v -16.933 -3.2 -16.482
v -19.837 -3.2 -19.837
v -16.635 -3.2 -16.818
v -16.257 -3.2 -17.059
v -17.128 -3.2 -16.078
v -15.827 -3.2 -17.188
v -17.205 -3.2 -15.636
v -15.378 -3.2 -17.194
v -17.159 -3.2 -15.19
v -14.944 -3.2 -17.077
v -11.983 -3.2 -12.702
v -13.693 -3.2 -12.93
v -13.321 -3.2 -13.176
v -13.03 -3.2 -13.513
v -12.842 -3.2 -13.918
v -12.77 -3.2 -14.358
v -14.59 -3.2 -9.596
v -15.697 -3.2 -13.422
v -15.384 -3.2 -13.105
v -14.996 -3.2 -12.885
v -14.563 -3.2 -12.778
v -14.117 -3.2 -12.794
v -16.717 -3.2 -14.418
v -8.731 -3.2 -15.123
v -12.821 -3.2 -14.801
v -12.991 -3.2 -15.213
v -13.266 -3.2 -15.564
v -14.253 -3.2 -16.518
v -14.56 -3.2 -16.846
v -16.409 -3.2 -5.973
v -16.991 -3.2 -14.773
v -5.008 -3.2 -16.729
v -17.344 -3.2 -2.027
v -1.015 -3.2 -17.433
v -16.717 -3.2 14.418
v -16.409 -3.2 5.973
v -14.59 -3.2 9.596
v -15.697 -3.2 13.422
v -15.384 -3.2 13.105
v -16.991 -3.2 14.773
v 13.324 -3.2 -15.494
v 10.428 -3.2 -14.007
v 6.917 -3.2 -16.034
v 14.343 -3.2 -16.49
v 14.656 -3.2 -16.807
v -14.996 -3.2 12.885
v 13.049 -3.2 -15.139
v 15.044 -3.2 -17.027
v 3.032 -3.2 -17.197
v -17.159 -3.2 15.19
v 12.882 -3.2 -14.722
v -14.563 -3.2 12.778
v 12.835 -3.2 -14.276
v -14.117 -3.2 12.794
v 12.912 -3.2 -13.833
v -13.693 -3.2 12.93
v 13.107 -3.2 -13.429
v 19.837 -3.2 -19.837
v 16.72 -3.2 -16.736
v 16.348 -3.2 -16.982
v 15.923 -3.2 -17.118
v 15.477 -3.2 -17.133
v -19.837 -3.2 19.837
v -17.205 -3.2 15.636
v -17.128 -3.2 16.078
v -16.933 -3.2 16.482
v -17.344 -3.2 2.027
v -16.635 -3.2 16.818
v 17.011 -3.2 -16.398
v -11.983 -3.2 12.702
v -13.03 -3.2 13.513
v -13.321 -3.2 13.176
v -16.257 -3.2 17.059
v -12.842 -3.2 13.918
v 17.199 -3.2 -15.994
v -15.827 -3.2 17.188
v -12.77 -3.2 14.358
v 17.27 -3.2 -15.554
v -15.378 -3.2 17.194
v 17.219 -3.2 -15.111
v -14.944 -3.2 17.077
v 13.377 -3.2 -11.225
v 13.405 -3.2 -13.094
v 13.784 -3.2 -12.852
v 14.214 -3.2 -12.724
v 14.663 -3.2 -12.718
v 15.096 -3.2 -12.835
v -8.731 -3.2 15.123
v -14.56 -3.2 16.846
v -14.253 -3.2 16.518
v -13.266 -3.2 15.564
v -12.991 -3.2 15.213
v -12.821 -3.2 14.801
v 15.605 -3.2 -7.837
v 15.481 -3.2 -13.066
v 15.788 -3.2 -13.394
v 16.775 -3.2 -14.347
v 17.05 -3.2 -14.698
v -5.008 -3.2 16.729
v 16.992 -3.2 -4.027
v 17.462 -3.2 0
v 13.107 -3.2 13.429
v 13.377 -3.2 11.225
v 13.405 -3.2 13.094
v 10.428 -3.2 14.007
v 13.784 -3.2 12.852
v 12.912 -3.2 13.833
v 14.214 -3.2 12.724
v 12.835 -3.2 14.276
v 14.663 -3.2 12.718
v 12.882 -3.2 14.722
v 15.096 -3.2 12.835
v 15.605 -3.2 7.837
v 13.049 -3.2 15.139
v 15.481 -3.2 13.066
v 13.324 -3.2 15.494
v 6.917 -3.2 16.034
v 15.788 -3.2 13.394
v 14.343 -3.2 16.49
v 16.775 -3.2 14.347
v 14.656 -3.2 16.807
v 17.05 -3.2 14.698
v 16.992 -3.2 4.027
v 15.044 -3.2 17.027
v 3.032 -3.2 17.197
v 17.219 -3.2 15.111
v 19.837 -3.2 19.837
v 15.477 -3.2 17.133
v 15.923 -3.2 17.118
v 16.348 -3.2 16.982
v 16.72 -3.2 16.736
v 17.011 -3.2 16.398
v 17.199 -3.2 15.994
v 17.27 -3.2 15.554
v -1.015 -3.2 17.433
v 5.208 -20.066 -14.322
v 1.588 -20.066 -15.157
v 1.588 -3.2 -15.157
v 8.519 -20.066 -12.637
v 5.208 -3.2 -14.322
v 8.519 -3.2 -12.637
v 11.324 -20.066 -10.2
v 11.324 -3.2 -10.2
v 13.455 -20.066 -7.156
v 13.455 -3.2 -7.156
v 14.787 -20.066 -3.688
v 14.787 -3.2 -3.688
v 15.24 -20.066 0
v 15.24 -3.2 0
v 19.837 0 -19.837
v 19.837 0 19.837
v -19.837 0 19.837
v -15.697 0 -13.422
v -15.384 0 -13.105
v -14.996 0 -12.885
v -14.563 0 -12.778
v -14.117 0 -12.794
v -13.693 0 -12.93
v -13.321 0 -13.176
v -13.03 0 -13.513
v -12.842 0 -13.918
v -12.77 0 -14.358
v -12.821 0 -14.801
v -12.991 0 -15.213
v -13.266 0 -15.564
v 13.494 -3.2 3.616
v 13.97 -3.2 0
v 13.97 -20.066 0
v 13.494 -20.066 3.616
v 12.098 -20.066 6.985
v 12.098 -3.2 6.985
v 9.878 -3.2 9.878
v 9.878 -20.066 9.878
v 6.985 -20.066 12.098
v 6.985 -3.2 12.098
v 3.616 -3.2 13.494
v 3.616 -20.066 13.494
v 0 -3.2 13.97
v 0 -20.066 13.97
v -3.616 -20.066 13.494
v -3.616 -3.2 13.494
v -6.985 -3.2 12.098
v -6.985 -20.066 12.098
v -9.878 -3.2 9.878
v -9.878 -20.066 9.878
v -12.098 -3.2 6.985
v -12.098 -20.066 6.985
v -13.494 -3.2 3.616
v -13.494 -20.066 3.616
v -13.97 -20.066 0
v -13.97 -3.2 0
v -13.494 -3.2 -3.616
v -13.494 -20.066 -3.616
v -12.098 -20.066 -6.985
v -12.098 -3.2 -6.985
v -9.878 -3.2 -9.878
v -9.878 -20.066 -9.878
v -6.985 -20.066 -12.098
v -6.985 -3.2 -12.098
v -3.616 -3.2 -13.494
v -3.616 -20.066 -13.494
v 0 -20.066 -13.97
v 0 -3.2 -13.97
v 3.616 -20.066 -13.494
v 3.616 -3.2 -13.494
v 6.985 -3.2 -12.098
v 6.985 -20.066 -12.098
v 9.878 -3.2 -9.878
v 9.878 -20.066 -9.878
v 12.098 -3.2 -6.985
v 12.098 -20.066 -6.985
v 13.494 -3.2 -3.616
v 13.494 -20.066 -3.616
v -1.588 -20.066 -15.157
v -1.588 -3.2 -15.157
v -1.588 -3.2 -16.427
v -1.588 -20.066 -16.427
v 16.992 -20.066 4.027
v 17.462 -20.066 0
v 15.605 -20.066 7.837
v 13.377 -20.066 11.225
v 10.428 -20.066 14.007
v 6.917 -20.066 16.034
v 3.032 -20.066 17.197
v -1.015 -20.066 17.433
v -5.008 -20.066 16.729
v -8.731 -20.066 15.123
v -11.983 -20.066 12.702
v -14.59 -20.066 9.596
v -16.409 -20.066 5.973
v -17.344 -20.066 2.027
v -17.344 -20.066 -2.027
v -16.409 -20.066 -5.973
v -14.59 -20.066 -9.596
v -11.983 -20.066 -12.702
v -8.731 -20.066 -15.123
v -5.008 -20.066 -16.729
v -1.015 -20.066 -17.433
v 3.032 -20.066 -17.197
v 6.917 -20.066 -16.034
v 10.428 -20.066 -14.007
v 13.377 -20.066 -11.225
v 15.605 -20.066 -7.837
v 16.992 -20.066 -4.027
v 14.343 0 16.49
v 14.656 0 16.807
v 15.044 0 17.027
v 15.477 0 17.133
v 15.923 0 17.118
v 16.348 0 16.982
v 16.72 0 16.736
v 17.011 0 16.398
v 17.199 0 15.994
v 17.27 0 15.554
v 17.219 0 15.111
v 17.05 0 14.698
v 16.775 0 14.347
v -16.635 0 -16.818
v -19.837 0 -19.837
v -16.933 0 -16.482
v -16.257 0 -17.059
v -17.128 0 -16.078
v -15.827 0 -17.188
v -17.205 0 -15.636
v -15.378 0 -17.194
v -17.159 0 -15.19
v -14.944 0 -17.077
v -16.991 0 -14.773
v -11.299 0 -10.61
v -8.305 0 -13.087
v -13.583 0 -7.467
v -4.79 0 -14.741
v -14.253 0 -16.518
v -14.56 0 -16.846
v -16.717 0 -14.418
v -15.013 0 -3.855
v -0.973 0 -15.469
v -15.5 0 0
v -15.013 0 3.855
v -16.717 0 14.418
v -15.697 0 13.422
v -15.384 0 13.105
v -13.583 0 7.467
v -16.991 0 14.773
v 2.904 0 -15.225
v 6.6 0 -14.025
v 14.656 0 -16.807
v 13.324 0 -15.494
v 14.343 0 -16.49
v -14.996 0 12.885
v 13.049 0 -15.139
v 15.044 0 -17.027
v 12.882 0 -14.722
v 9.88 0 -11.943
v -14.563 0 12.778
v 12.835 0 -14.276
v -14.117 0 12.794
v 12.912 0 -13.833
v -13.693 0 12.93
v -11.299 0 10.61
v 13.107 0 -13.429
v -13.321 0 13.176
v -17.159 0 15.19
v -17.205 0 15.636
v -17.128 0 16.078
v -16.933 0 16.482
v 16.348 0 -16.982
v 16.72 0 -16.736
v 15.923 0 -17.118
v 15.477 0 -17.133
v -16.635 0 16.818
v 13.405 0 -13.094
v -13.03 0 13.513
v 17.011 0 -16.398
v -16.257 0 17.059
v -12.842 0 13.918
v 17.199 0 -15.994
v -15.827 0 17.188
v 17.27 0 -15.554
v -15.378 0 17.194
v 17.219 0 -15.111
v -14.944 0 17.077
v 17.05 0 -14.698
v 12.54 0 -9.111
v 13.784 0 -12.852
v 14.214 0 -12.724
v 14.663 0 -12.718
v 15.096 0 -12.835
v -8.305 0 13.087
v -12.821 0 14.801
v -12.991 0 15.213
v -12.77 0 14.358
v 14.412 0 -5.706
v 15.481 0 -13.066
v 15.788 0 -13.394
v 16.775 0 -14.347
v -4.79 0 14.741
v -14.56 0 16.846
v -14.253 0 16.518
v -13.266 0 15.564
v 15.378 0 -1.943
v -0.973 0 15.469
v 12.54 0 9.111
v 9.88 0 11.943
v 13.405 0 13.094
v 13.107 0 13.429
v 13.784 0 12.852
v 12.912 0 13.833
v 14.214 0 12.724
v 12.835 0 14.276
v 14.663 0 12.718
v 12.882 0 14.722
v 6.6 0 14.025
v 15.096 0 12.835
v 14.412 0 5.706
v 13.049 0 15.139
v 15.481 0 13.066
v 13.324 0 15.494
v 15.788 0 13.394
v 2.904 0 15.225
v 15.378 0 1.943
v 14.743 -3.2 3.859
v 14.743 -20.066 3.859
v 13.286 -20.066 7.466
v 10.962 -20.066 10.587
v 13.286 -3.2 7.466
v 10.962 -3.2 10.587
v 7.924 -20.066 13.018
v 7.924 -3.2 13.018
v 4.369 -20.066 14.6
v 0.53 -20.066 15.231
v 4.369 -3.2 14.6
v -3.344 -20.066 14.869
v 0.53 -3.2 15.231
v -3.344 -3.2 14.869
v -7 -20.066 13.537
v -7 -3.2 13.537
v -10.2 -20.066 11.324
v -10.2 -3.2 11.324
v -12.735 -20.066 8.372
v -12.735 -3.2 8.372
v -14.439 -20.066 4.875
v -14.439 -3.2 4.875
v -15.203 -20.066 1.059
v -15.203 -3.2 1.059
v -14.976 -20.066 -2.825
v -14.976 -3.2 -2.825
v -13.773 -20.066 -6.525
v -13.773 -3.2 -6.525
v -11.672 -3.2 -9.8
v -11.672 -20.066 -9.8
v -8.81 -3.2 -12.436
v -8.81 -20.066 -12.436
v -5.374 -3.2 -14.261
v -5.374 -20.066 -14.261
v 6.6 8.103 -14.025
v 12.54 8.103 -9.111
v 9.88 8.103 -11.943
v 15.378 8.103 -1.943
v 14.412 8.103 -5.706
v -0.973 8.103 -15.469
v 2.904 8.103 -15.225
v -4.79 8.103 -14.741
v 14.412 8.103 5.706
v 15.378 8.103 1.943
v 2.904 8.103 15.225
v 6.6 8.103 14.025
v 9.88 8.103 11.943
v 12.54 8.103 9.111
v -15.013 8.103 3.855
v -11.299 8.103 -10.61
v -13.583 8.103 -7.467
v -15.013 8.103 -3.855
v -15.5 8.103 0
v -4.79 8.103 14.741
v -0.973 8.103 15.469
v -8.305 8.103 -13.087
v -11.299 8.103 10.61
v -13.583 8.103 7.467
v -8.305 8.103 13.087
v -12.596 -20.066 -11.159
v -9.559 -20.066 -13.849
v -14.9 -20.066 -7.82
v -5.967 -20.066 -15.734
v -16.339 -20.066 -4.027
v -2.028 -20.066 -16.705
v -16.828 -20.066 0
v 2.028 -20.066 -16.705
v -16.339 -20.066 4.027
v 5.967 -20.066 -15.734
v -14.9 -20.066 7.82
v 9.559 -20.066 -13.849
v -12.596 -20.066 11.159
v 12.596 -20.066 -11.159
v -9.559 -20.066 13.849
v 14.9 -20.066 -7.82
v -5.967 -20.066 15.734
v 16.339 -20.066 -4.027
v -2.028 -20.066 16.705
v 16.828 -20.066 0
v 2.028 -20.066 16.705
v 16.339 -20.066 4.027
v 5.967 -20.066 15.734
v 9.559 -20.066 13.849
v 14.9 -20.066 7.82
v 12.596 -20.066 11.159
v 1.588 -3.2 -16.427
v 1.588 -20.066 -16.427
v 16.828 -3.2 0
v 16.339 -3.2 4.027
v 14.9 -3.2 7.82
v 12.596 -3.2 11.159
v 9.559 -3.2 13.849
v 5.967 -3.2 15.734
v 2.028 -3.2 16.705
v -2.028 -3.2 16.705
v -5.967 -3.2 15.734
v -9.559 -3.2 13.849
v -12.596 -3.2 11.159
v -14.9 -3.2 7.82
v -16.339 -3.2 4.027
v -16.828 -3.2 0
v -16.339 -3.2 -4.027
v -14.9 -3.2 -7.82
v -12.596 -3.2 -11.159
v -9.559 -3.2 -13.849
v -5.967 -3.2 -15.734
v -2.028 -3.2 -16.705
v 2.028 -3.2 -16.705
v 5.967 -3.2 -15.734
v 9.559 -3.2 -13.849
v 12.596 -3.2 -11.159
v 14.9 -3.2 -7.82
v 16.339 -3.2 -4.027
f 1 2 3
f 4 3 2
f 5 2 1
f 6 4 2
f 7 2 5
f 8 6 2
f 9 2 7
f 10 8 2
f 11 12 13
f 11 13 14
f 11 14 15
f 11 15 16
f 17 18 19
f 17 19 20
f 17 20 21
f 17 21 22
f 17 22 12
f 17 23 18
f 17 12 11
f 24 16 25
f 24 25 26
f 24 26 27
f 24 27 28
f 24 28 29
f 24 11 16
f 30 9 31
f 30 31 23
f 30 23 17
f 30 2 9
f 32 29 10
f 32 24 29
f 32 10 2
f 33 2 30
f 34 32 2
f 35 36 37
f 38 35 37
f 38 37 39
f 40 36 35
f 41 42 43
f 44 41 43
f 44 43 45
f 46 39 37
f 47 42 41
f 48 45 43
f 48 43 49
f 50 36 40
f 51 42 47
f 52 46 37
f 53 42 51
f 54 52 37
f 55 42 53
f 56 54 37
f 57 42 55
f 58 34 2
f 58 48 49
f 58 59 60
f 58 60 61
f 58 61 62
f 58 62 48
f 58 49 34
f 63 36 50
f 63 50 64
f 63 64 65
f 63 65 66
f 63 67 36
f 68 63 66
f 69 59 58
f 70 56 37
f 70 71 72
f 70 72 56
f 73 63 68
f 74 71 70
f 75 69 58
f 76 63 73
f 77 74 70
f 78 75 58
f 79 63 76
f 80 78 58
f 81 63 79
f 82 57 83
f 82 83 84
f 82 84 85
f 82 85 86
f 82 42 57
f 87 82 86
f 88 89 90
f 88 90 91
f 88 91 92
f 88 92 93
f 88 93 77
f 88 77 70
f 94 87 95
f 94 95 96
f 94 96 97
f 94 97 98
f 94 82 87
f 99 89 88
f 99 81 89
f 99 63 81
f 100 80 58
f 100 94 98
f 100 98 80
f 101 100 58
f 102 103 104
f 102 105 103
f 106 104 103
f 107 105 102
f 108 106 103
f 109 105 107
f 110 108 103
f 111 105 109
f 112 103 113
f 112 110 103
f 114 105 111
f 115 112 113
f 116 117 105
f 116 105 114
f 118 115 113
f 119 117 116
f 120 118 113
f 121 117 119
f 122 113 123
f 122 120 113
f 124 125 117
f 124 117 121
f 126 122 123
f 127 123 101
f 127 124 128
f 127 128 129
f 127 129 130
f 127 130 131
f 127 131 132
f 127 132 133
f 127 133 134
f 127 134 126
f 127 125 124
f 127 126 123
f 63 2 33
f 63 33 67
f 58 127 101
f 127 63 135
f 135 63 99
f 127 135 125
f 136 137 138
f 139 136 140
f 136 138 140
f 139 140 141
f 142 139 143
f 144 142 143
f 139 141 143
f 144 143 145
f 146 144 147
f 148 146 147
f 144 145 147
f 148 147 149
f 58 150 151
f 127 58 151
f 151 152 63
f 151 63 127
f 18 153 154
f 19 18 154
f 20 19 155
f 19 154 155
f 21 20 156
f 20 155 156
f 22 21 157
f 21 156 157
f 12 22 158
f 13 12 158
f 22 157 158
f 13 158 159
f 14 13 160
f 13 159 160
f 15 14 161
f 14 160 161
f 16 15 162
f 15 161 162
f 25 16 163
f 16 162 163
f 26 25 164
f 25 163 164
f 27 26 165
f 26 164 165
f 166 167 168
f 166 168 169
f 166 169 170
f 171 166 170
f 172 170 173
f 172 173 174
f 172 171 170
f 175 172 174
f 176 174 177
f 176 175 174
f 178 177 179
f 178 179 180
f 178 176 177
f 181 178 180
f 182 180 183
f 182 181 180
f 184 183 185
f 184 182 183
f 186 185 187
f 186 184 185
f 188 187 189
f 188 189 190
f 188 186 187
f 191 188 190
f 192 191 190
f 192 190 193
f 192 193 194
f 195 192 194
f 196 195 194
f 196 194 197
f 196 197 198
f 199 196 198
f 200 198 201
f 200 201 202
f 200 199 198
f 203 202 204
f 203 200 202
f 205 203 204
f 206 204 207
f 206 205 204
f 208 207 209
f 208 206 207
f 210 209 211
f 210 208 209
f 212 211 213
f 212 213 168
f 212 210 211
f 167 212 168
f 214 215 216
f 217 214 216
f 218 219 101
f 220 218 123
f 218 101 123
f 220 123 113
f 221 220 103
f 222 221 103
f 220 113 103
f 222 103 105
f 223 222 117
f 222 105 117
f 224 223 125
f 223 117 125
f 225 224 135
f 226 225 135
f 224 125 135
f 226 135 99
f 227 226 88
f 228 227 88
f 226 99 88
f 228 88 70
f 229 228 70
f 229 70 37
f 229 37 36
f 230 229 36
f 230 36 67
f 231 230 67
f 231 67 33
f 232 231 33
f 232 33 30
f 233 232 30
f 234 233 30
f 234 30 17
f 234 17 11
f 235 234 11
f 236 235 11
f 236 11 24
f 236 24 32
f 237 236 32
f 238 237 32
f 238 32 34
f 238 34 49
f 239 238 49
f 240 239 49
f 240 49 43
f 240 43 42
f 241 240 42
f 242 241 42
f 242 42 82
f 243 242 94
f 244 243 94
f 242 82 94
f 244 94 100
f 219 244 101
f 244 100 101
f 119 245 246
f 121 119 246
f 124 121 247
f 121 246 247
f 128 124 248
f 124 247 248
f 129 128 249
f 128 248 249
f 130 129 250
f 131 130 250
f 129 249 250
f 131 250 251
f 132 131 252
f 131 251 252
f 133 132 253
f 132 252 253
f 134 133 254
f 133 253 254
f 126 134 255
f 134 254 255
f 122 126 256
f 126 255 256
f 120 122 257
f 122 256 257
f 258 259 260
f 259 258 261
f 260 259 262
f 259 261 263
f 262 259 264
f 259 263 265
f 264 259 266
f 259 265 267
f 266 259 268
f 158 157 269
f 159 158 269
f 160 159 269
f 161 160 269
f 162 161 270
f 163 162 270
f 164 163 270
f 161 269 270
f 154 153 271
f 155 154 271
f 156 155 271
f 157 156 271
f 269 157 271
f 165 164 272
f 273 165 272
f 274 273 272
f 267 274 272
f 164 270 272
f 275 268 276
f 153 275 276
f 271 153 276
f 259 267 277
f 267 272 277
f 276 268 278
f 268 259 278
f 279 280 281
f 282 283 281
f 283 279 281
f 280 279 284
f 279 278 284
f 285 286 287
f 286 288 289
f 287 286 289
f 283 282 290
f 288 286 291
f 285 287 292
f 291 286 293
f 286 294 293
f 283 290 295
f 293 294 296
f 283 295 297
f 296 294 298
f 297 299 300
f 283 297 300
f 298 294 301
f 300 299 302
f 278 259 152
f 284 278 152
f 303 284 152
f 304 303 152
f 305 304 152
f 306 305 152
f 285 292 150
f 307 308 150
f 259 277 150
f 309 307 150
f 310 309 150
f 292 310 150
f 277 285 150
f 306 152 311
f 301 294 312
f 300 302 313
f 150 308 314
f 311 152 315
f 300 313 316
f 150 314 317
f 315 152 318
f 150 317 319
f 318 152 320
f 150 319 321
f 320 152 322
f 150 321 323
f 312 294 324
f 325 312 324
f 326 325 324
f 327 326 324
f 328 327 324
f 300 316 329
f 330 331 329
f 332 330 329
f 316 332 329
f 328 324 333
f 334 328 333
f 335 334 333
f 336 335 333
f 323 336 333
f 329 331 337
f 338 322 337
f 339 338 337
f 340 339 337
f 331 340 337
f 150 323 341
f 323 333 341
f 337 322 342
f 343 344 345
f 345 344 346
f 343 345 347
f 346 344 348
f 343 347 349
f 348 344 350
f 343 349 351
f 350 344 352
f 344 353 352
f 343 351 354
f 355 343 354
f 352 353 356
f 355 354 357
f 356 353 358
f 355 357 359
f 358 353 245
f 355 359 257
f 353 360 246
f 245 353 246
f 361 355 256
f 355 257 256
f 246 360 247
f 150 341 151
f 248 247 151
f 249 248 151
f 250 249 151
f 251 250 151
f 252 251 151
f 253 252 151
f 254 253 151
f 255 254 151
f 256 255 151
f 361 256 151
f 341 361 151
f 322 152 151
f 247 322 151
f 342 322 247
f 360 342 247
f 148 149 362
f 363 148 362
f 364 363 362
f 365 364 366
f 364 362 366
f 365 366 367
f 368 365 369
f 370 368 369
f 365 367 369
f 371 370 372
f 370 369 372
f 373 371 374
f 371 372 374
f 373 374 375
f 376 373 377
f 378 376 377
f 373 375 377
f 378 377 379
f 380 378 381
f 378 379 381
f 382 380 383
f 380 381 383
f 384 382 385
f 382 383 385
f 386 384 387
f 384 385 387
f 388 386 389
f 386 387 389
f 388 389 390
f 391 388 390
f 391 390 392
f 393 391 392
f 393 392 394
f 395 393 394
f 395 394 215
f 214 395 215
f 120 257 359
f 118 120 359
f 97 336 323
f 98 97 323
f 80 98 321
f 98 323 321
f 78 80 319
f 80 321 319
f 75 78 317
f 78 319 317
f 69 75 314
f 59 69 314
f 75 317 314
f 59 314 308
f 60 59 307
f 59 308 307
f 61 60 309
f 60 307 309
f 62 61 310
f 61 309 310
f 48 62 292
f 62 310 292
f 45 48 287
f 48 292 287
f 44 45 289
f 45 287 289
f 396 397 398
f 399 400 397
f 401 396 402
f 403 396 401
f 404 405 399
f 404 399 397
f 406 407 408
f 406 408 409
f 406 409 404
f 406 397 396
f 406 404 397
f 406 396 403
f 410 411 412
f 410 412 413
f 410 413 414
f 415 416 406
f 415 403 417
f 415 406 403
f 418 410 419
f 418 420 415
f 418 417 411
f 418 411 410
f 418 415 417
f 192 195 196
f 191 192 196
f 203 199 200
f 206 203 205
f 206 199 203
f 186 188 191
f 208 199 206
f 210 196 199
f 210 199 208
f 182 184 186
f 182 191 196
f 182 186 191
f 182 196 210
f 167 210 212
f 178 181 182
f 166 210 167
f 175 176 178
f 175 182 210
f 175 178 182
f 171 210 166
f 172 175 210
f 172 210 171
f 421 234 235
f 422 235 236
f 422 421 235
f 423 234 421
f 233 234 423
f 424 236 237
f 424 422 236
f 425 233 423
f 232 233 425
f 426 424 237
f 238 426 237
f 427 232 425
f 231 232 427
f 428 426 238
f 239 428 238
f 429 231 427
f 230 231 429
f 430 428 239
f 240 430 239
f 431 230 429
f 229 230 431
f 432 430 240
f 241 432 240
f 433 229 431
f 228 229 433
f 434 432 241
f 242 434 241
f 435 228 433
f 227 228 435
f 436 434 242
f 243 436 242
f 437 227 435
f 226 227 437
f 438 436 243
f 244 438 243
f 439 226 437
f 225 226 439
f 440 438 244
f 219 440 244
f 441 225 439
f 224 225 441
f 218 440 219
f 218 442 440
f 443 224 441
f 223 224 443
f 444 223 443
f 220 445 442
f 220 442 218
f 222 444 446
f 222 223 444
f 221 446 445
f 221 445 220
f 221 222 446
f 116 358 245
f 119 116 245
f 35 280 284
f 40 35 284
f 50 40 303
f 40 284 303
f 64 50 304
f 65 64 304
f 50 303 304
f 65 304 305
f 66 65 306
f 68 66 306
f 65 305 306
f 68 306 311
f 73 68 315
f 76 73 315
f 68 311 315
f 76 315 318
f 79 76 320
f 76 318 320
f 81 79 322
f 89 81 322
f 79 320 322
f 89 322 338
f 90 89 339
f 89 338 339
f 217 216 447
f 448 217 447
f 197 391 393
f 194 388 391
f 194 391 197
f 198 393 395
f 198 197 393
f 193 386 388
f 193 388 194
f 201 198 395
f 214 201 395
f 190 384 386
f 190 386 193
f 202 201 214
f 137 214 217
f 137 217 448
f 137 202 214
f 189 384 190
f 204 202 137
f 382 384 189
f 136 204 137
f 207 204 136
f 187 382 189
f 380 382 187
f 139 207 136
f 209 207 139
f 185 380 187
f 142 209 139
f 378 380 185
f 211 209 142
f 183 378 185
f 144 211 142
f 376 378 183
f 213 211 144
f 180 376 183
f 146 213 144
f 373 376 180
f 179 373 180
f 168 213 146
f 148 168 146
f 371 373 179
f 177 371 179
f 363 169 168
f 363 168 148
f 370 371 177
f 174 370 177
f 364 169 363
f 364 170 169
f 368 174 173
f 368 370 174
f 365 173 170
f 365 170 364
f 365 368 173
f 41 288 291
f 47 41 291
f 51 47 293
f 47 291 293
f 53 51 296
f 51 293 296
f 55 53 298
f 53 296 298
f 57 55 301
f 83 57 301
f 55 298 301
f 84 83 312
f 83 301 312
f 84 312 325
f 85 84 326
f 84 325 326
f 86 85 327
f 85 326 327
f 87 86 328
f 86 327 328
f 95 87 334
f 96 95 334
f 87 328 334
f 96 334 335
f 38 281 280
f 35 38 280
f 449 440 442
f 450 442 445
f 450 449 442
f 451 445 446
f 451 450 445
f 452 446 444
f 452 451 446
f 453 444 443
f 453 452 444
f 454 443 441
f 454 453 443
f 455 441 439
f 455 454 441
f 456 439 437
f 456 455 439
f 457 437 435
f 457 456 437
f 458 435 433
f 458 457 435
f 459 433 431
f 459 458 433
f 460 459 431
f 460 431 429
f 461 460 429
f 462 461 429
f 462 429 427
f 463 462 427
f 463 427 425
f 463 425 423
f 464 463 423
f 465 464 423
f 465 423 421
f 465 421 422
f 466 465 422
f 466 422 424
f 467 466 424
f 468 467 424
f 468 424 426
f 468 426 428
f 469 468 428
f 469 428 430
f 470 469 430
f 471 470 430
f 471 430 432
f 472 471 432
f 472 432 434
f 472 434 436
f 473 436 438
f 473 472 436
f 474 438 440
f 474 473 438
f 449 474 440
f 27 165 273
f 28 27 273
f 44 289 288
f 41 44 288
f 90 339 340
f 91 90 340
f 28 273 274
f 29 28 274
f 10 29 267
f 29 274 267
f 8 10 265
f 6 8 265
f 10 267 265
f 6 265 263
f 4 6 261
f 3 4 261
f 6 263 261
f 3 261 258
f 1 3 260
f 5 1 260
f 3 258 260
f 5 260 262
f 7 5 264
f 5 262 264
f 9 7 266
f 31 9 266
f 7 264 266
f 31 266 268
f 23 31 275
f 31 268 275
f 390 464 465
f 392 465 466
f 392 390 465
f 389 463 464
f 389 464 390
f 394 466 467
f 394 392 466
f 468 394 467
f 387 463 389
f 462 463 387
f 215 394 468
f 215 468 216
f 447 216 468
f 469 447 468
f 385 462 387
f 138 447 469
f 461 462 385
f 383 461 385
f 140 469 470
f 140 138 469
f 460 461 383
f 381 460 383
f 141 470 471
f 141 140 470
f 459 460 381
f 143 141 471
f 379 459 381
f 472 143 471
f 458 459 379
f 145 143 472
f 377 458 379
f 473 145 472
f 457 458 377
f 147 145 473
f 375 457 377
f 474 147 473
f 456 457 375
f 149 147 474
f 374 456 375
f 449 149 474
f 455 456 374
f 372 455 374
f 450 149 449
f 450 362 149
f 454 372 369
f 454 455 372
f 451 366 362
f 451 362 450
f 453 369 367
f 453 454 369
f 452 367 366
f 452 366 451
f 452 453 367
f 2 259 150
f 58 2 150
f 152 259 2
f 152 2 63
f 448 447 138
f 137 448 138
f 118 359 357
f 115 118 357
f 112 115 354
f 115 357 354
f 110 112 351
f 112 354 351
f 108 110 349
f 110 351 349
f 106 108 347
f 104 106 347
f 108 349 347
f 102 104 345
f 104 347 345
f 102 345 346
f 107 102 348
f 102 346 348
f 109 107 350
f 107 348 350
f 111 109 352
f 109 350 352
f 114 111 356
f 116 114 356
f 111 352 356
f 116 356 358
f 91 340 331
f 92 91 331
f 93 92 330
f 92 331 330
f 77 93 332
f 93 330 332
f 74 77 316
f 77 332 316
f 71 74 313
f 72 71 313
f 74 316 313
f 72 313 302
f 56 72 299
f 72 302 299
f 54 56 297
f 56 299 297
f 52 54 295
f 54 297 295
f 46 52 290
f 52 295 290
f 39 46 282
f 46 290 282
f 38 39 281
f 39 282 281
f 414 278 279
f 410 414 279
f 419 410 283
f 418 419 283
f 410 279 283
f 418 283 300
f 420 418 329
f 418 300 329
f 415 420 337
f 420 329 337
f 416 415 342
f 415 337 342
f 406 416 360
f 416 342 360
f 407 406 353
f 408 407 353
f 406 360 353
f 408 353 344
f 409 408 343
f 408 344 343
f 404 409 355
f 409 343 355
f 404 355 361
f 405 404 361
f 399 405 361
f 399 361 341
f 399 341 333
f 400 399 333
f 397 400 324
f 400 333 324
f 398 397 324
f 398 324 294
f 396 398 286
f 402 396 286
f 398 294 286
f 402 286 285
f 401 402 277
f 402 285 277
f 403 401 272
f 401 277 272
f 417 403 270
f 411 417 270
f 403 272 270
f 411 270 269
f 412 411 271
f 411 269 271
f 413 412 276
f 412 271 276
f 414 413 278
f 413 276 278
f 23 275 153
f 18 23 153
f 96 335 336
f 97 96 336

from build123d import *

# Parameters (mm, degrees)
F0_W     = 39.6748
F0_H     = 39.6748
F0_R     = 17.4625
F0_R_2   = 16.8275
F1_DEPTH = 3.2004
F2_DEPTH = 20.066
F3_R     = 13.97
F4_DEPTH = 16.8656
F5_R     = 15.5
F6_DEPTH = 8.1026


with BuildPart() as f1:
    # F0 (on Front) → F1 (new body)
    with BuildSketch(Plane.XZ):
        Rectangle(F0_W, F0_H)
        with BuildLine():
            Line((-13.265674, -15.564284), (-14.252556, -16.518023))
            ThreePointArc((-14.252556, -16.518023), (-16.635155, -16.817997), (-16.716767, -14.417977))
            Line((-16.716767, -14.417977), (-15.697317, -13.421976))
            ThreePointArc((-15.697317, -13.421976), (-13.320738, -13.175603), (-13.265674, -15.564284))
        make_face(mode=Mode.SUBTRACT)
        with BuildLine():
            ThreePointArc((13.323525, -15.493634), (13.405137, -13.093613), (15.787736, -13.393587))
            Line((15.787736, -13.393587), (16.774618, -14.347326))
            ThreePointArc((16.774618, -14.347326), (16.719554, -16.736007), (14.342975, -16.489634))
            Line((14.342975, -16.489634), (13.323525, -15.493634))
        make_face(mode=Mode.SUBTRACT)
        with BuildLine():
            ThreePointArc((-16.716767, 14.417977), (-16.635155, 16.817997), (-14.252556, 16.518023))
            Line((-14.252556, 16.518023), (-13.265674, 15.564284))
            ThreePointArc((-13.265674, 15.564284), (-13.320738, 13.175603), (-15.697317, 13.421976))
            Line((-15.697317, 13.421976), (-16.716767, 14.417977))
        make_face(mode=Mode.SUBTRACT)
        Circle(F0_R, mode=Mode.SUBTRACT)
        with BuildLine():
            Line((16.774618, 14.347326), (15.787736, 13.393587))
            ThreePointArc((15.787736, 13.393587), (13.405137, 13.093613), (13.323525, 15.493634))
            Line((13.323525, 15.493634), (14.342975, 16.489634))
            ThreePointArc((14.342975, 16.489634), (16.719554, 16.736007), (16.774618, 14.347326))
        make_face(mode=Mode.SUBTRACT)
        Circle(F0_R)
        Circle(F0_R_2, mode=Mode.SUBTRACT)
        Circle(F0_R_2)
    extrude(amount=F1_DEPTH)

    # F0 (on Front) → F2 (join)
    with BuildSketch(Plane.XZ):
        Circle(F0_R)
        Circle(F0_R_2, mode=Mode.SUBTRACT)
    extrude(amount=F2_DEPTH)

    # F3 (on face) → F4 (join)
    with BuildSketch(Plane.XZ.offset(3.2004)):
        with BuildLine():
            ThreePointArc((1.5875, -15.157092), (11.323672, -10.19961), (15.24, 0))
            ThreePointArc((15.24, 0), (-10.19961, 11.323672), (-1.5875, -15.157092))
            Line((-1.5875, -15.157092), (1.5875, -15.157092))
        make_face()
        Circle(F3_R, mode=Mode.SUBTRACT)
        with BuildLine():
            ThreePointArc((1.5875, -15.157092), (0, -15.24), (-1.5875, -15.157092))
            Line((-1.5875, -15.157092), (-1.5875, -16.427092))
            Line((-1.5875, -16.427092), (1.5875, -16.427092))
            Line((1.5875, -16.427092), (1.5875, -15.157092))
        make_face()
        with BuildLine():
            Line((1.5875, -15.157092), (-1.5875, -15.157092))
            ThreePointArc((-1.5875, -15.157092), (0, -15.24), (1.5875, -15.157092))
        make_face()
    extrude(amount=F4_DEPTH)

    # F5 (on face) → F6 (join)
    with BuildSketch(Plane(origin=(0, 0, 0), x_dir=(-1, 0, 0), z_dir=(0, 1, 0))):
        Circle(F5_R)
    extrude(amount=F6_DEPTH)


solid = f1.part
